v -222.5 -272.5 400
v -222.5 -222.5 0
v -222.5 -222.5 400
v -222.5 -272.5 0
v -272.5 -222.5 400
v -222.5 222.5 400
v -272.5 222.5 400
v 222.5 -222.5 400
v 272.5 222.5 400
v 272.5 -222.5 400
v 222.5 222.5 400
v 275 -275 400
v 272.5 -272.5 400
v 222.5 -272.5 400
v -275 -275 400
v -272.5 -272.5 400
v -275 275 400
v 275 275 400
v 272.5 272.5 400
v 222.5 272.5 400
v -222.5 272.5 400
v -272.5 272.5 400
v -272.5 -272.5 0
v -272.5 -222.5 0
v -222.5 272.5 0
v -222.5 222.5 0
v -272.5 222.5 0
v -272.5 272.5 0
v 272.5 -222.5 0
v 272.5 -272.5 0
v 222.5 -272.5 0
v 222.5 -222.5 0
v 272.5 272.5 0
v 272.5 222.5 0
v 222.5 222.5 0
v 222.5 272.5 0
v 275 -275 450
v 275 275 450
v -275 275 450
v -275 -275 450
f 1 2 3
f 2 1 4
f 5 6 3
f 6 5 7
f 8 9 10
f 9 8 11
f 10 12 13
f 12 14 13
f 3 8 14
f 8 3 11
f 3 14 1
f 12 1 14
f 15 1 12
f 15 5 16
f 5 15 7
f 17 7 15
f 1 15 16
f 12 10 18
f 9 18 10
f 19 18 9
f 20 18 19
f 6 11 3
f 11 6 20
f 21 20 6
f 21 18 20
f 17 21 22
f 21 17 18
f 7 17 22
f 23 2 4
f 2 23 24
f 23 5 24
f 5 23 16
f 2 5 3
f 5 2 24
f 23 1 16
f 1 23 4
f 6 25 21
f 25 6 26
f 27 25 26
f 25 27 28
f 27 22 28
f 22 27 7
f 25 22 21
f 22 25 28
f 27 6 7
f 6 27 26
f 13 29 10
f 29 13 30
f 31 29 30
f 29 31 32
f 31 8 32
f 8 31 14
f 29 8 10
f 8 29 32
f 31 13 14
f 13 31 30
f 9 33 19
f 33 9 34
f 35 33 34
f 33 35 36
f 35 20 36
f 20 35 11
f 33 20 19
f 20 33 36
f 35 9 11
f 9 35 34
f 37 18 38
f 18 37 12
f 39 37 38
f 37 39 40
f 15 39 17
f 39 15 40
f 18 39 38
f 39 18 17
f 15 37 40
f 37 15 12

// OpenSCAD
lack_table();

module lack_table(){
    translate([0,0,400]) lack_top();
    for(X=[-1,1], Y=[-1,1]) translate([247.5*X, 247.5*Y, 0]) lack_leg();
}

module lack_leg(){
    translate([0,0,200]) cube([50,50,400], center=true);
}

module lack_top(){
    translate([0,0,25]) cube([550,550,50], center=true);
}
